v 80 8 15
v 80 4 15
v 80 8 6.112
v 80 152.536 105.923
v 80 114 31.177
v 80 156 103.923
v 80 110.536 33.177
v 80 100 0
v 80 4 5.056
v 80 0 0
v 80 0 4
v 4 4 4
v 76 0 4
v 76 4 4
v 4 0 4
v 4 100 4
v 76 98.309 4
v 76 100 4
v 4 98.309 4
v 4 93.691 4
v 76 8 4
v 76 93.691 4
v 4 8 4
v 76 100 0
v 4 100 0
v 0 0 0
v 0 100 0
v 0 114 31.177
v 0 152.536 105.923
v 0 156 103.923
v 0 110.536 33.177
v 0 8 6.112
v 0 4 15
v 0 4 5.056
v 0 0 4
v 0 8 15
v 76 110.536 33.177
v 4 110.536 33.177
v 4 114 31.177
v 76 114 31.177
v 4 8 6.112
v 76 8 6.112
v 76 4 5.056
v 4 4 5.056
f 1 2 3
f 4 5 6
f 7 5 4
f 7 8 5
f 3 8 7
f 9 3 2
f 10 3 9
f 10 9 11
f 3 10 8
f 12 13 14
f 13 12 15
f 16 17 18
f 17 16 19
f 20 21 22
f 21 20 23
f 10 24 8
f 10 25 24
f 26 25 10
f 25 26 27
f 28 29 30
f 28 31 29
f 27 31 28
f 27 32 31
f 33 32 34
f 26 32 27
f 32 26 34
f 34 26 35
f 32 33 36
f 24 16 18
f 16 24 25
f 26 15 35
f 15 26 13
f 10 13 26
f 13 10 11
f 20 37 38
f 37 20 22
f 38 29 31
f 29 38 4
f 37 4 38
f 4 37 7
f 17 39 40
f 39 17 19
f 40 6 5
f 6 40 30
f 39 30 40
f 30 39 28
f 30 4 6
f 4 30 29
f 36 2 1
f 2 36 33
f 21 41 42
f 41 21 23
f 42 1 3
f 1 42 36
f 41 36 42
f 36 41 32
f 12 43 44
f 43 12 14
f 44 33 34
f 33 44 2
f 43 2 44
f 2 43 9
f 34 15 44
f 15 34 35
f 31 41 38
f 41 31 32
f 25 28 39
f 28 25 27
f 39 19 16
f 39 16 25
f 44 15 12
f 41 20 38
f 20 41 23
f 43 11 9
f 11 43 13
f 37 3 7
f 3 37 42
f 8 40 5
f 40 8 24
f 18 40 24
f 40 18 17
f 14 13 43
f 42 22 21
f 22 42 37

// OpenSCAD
// Parametric Phone/Tablet Support Template
// L-shaped stand with adjustable angle

$fn = 48;

// Parameters
width = 80;      // mm
depth = 100;     // mm
height = 120;    // mm
wall = 4;        // mm
angle = 30;      // degrees
lip_height = 15; // mm

// L-shaped support
module support() {
    // Base
    cube([width, depth, wall]);
    
    // Back support (angled)
    translate([0, depth - wall, 0])
        rotate([90 - angle, 0, 0])
            cube([width, height, wall]);
    
    // Front lip to hold device
    translate([0, wall, 0])
        cube([width, wall, lip_height]);
    
    // Side supports for stability
    hull() {
        cube([wall, depth, wall]);
        translate([0, depth - wall, 0])
            rotate([90 - angle, 0, 0])
                cube([wall, height * 0.3, wall]);
    }
    
    translate([width - wall, 0, 0])
    hull() {
        cube([wall, depth, wall]);
        translate([0, depth - wall, 0])
            rotate([90 - angle, 0, 0])
                cube([wall, height * 0.3, wall]);
    }
}

support();
